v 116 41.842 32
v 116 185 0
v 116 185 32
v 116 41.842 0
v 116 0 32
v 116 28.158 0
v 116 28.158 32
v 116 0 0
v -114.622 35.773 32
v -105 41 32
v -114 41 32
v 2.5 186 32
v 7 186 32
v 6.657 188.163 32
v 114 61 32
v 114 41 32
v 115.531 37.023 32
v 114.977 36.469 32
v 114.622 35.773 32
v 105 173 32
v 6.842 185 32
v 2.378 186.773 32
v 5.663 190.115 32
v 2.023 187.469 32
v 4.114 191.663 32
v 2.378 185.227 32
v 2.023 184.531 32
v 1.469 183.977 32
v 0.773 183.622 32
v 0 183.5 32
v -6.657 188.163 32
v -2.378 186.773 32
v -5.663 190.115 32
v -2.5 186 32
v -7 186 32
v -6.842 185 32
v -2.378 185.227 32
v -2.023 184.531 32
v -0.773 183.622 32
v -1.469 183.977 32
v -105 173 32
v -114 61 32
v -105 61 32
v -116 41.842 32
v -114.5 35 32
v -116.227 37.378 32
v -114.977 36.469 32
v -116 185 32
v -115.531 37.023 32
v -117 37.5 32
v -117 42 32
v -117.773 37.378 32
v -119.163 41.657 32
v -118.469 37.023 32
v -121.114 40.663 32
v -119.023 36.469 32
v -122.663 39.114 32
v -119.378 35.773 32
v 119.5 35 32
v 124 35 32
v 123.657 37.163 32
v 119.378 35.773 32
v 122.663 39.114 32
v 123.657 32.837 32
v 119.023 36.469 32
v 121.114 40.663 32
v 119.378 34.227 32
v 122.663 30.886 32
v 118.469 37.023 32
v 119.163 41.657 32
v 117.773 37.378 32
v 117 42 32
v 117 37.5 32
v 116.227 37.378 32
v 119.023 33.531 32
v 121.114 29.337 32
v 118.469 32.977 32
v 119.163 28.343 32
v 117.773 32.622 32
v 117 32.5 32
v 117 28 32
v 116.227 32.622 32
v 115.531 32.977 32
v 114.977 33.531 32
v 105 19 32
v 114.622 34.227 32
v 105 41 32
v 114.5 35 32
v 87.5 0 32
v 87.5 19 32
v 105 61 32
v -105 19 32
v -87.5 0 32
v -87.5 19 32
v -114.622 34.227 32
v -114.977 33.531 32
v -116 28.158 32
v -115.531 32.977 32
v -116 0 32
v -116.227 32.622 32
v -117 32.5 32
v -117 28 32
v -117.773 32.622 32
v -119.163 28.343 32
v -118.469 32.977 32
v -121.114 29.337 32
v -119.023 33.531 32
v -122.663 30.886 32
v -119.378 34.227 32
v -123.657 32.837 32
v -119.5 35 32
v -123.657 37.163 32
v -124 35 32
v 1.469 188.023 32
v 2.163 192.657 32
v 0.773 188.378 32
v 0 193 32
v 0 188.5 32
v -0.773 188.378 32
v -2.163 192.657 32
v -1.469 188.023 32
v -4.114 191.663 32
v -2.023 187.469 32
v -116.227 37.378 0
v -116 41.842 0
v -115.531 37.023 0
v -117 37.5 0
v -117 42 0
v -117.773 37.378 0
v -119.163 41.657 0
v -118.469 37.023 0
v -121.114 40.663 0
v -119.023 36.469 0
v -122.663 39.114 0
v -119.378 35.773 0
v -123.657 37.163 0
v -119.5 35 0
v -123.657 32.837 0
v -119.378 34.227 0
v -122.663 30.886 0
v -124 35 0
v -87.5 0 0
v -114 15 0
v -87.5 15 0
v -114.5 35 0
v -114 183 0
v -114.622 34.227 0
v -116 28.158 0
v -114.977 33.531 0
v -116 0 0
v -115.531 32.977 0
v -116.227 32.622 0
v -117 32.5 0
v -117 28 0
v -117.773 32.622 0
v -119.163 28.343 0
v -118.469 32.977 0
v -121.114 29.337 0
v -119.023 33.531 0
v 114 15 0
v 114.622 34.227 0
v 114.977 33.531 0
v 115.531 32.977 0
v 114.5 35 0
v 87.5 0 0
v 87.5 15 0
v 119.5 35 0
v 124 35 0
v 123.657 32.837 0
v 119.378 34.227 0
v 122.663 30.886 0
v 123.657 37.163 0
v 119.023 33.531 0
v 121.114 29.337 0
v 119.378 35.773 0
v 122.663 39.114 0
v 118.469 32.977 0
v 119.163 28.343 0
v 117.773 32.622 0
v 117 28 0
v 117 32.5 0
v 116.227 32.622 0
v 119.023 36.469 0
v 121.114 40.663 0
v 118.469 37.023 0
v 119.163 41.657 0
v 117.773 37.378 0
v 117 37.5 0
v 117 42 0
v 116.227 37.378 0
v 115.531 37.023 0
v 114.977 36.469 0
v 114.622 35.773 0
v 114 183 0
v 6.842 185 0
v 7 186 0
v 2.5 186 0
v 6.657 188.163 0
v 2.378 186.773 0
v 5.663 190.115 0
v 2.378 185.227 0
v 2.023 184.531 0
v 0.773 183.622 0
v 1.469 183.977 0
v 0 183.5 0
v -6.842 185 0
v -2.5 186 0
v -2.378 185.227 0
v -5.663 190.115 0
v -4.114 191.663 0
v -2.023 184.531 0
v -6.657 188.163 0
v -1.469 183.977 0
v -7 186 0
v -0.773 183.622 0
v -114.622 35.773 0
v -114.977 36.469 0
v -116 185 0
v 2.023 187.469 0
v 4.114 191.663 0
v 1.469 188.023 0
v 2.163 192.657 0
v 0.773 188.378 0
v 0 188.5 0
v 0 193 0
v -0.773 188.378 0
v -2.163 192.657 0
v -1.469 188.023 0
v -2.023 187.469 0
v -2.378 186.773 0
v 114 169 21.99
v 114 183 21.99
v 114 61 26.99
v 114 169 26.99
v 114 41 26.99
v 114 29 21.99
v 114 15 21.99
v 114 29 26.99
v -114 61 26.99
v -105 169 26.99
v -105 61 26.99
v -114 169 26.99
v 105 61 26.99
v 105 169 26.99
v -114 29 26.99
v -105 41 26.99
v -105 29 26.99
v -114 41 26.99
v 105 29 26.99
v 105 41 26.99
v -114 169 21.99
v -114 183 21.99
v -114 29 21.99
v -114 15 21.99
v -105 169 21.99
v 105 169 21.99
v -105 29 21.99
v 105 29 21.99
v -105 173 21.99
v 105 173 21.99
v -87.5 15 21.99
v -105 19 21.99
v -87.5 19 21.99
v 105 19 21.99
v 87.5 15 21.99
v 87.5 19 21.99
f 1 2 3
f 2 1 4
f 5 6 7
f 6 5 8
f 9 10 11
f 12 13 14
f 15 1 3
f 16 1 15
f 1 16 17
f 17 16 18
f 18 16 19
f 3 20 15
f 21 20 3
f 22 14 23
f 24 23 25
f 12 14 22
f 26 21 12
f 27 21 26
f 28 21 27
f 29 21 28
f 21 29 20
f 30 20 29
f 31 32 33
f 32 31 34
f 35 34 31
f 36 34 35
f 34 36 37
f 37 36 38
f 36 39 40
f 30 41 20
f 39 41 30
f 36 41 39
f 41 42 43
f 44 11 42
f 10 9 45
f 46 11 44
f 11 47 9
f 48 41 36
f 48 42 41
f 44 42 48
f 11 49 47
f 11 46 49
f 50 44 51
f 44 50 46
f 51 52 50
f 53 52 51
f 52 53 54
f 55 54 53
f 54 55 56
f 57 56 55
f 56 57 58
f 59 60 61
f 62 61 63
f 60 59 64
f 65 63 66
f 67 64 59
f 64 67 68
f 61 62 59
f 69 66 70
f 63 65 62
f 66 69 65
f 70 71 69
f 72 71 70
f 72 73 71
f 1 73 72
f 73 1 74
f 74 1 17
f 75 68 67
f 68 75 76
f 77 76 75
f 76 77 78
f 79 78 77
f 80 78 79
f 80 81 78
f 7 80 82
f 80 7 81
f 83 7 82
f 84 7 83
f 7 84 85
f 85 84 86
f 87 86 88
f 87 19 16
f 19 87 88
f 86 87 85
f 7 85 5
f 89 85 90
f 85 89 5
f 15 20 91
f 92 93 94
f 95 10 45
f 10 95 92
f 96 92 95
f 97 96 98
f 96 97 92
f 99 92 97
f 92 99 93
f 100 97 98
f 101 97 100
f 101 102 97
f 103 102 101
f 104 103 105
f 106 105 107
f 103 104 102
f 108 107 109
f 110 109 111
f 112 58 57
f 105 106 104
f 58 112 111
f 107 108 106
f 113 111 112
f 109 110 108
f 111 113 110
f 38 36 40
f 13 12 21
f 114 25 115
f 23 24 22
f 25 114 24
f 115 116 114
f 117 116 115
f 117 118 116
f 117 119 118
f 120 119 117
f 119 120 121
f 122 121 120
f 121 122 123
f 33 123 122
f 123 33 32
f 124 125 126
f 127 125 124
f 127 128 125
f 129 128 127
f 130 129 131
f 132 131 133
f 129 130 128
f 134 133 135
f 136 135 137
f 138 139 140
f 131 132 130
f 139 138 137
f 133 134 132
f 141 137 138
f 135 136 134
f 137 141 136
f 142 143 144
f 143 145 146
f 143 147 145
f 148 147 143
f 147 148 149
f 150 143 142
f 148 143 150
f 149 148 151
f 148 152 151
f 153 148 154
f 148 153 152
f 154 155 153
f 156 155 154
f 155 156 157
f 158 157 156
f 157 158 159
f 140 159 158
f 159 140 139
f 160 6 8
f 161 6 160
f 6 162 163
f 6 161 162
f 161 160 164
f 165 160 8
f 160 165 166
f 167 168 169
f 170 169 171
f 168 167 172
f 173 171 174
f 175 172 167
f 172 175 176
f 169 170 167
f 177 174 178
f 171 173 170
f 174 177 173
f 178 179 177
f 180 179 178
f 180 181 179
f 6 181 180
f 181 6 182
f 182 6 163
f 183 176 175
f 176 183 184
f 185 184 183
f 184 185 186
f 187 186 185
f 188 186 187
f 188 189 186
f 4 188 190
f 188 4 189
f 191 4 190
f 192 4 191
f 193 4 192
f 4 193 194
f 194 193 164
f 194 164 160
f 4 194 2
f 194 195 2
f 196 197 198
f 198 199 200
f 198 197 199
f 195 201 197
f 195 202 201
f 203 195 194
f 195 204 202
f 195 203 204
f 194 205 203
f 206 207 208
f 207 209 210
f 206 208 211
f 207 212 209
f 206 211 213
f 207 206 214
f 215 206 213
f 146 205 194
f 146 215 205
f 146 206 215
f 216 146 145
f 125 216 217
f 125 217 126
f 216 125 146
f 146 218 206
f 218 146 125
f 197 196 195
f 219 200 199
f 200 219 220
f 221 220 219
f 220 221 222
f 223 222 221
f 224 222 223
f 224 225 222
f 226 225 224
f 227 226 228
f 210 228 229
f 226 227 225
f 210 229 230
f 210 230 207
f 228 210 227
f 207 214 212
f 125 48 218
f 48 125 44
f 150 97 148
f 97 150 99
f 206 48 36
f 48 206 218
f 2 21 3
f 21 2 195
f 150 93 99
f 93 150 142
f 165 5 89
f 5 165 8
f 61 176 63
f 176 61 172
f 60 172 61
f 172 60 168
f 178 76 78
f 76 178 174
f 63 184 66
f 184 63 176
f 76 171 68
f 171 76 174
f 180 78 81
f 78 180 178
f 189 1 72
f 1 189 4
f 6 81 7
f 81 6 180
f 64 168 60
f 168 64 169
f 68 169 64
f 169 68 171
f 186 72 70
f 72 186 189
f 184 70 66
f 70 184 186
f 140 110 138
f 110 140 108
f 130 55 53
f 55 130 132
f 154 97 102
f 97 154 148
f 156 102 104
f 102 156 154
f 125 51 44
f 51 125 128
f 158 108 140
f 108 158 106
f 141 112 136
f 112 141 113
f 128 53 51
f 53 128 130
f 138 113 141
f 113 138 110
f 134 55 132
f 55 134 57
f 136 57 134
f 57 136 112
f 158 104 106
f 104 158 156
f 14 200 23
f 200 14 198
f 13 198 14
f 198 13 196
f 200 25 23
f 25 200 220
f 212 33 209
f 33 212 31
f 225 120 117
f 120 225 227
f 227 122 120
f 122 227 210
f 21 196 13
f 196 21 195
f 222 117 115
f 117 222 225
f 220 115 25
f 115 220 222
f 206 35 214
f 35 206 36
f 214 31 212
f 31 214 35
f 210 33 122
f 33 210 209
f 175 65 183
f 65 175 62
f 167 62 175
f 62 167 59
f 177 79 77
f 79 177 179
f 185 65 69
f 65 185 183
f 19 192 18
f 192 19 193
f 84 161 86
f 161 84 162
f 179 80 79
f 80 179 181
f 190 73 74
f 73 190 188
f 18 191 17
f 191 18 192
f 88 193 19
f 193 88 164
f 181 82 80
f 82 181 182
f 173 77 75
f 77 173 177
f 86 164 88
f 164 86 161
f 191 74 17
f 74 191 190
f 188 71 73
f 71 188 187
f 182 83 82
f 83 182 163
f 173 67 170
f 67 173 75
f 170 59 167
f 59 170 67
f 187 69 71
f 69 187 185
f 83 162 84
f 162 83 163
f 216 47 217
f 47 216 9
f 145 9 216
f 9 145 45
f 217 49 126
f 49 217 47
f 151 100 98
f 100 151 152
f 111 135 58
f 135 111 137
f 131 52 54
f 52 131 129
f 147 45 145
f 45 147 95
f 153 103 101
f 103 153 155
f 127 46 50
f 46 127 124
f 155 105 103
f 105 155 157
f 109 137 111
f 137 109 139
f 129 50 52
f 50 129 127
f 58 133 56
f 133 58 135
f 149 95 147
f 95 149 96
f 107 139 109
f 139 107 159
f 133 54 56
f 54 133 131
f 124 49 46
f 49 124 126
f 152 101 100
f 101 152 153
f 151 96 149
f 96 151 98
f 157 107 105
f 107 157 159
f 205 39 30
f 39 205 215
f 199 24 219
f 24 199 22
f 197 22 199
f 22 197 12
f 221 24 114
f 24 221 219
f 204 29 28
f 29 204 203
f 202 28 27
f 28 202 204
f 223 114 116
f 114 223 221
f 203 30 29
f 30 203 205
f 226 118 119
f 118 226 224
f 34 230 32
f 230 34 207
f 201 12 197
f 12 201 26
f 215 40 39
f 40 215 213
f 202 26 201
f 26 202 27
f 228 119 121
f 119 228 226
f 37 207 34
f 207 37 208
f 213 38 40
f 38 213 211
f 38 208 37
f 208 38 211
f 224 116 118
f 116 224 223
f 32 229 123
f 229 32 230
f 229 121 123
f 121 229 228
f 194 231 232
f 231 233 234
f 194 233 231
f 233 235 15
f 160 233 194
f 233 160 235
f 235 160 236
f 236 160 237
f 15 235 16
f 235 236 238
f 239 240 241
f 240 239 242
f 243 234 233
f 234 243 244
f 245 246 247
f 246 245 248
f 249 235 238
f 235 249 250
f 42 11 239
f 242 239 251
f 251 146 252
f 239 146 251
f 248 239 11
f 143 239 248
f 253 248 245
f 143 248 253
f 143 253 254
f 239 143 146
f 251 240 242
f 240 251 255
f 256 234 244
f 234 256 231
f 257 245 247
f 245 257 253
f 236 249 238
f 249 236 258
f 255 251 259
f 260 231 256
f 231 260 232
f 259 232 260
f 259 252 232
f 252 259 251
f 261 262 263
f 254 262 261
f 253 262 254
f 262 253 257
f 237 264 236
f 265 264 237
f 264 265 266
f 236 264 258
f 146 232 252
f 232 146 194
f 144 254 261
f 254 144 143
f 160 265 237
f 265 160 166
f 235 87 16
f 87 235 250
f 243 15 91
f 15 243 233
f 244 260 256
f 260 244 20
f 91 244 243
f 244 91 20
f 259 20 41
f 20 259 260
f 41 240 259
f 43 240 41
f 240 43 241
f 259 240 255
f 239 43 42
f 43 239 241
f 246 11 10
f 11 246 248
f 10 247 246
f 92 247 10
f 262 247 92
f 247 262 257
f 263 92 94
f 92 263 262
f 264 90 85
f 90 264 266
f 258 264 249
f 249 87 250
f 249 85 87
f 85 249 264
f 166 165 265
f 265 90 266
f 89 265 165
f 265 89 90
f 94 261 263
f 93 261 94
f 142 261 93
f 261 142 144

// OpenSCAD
pcmWidth = 228;
pcmDepth = 169-1;
pcmLowerClampHeight = 22;
pcmUpperClampHeight = 27;
sidePadding = 2; // 15;
connectorPadding = 15;
backPadding = 2;

overallWidth = pcmWidth + (2 * sidePadding);
overallDepth = pcmDepth + connectorPadding + backPadding;
overallHeight = pcmUpperClampHeight + 5;

connectorWidth = 175;

$fn = 20;

module boss() {
  cylinder(overallHeight, 7, 7);
}

module boltHole() {
  translate([0, 0, -0.5])
    cylinder(overallHeight + 1, 2.5, 2.5);
}

module boltHoles() {
  translate([overallWidth/2 + 1, 35, 0])
    boltHole();

  translate([-overallWidth/2 - 1, 35, 0])
    boltHole();

  translate([0, overallDepth + 1, 0])
    boltHole();
}

module outside() {
  translate([-overallWidth/2, 0, 0])
    cube([overallWidth, overallDepth, overallHeight]);
    
  translate([overallWidth/2 + 1, 35, 0])
    boss();

  translate([-overallWidth/2 - 1, 35, 0])
    boss();

  translate([0, overallDepth + 1, 0])
    boss();
}

module cutout() {
  translate([0, connectorPadding+4, 0])//pcmUpperClampHeight])
  linear_extrude(200)
  polygon(
    points=[
      [0,0],
      [105,0],
      [105,22],
      [pcmWidth / 2,22],
      [pcmWidth / 2,42],
      [105,42],
      [105,154],
      [-105,154],
      [-105,42],
      [-pcmWidth / 2,42],
      [-pcmWidth / 2,22],
      [-105,22],
      [-105,0],
      ],
      paths=[[0,1,2,3,4,5,6,7,8,9,10,11,12,0]]);
}

module base() {
  union() {
    //translate([-pcmWidth / 2, connectorPadding, -0.01])
    translate([0, pcmDepth / 2 + connectorPadding, pcmUpperClampHeight / 2 - 0.01])
      cube([pcmWidth, 140, pcmUpperClampHeight], center = true);
      
    translate([0, pcmDepth / 2 + connectorPadding, pcmLowerClampHeight / 2 - 0.01])
      cube([pcmWidth, pcmDepth, pcmLowerClampHeight], center = true);
  }
}

module connector() {
    // 9mm from base to bottom of connector housing
  translate([-connectorWidth/2, -1, -1])
    cube([connectorWidth, 50, 50]);
}

module truncate() {
  translate([-pcmWidth/2 -10, -1, -1])
    cube([200, 500, 50]);
}

difference() {
    outside();
    boltHoles();
    base();
    cutout();
    connector();
//    truncate();
}    
    
